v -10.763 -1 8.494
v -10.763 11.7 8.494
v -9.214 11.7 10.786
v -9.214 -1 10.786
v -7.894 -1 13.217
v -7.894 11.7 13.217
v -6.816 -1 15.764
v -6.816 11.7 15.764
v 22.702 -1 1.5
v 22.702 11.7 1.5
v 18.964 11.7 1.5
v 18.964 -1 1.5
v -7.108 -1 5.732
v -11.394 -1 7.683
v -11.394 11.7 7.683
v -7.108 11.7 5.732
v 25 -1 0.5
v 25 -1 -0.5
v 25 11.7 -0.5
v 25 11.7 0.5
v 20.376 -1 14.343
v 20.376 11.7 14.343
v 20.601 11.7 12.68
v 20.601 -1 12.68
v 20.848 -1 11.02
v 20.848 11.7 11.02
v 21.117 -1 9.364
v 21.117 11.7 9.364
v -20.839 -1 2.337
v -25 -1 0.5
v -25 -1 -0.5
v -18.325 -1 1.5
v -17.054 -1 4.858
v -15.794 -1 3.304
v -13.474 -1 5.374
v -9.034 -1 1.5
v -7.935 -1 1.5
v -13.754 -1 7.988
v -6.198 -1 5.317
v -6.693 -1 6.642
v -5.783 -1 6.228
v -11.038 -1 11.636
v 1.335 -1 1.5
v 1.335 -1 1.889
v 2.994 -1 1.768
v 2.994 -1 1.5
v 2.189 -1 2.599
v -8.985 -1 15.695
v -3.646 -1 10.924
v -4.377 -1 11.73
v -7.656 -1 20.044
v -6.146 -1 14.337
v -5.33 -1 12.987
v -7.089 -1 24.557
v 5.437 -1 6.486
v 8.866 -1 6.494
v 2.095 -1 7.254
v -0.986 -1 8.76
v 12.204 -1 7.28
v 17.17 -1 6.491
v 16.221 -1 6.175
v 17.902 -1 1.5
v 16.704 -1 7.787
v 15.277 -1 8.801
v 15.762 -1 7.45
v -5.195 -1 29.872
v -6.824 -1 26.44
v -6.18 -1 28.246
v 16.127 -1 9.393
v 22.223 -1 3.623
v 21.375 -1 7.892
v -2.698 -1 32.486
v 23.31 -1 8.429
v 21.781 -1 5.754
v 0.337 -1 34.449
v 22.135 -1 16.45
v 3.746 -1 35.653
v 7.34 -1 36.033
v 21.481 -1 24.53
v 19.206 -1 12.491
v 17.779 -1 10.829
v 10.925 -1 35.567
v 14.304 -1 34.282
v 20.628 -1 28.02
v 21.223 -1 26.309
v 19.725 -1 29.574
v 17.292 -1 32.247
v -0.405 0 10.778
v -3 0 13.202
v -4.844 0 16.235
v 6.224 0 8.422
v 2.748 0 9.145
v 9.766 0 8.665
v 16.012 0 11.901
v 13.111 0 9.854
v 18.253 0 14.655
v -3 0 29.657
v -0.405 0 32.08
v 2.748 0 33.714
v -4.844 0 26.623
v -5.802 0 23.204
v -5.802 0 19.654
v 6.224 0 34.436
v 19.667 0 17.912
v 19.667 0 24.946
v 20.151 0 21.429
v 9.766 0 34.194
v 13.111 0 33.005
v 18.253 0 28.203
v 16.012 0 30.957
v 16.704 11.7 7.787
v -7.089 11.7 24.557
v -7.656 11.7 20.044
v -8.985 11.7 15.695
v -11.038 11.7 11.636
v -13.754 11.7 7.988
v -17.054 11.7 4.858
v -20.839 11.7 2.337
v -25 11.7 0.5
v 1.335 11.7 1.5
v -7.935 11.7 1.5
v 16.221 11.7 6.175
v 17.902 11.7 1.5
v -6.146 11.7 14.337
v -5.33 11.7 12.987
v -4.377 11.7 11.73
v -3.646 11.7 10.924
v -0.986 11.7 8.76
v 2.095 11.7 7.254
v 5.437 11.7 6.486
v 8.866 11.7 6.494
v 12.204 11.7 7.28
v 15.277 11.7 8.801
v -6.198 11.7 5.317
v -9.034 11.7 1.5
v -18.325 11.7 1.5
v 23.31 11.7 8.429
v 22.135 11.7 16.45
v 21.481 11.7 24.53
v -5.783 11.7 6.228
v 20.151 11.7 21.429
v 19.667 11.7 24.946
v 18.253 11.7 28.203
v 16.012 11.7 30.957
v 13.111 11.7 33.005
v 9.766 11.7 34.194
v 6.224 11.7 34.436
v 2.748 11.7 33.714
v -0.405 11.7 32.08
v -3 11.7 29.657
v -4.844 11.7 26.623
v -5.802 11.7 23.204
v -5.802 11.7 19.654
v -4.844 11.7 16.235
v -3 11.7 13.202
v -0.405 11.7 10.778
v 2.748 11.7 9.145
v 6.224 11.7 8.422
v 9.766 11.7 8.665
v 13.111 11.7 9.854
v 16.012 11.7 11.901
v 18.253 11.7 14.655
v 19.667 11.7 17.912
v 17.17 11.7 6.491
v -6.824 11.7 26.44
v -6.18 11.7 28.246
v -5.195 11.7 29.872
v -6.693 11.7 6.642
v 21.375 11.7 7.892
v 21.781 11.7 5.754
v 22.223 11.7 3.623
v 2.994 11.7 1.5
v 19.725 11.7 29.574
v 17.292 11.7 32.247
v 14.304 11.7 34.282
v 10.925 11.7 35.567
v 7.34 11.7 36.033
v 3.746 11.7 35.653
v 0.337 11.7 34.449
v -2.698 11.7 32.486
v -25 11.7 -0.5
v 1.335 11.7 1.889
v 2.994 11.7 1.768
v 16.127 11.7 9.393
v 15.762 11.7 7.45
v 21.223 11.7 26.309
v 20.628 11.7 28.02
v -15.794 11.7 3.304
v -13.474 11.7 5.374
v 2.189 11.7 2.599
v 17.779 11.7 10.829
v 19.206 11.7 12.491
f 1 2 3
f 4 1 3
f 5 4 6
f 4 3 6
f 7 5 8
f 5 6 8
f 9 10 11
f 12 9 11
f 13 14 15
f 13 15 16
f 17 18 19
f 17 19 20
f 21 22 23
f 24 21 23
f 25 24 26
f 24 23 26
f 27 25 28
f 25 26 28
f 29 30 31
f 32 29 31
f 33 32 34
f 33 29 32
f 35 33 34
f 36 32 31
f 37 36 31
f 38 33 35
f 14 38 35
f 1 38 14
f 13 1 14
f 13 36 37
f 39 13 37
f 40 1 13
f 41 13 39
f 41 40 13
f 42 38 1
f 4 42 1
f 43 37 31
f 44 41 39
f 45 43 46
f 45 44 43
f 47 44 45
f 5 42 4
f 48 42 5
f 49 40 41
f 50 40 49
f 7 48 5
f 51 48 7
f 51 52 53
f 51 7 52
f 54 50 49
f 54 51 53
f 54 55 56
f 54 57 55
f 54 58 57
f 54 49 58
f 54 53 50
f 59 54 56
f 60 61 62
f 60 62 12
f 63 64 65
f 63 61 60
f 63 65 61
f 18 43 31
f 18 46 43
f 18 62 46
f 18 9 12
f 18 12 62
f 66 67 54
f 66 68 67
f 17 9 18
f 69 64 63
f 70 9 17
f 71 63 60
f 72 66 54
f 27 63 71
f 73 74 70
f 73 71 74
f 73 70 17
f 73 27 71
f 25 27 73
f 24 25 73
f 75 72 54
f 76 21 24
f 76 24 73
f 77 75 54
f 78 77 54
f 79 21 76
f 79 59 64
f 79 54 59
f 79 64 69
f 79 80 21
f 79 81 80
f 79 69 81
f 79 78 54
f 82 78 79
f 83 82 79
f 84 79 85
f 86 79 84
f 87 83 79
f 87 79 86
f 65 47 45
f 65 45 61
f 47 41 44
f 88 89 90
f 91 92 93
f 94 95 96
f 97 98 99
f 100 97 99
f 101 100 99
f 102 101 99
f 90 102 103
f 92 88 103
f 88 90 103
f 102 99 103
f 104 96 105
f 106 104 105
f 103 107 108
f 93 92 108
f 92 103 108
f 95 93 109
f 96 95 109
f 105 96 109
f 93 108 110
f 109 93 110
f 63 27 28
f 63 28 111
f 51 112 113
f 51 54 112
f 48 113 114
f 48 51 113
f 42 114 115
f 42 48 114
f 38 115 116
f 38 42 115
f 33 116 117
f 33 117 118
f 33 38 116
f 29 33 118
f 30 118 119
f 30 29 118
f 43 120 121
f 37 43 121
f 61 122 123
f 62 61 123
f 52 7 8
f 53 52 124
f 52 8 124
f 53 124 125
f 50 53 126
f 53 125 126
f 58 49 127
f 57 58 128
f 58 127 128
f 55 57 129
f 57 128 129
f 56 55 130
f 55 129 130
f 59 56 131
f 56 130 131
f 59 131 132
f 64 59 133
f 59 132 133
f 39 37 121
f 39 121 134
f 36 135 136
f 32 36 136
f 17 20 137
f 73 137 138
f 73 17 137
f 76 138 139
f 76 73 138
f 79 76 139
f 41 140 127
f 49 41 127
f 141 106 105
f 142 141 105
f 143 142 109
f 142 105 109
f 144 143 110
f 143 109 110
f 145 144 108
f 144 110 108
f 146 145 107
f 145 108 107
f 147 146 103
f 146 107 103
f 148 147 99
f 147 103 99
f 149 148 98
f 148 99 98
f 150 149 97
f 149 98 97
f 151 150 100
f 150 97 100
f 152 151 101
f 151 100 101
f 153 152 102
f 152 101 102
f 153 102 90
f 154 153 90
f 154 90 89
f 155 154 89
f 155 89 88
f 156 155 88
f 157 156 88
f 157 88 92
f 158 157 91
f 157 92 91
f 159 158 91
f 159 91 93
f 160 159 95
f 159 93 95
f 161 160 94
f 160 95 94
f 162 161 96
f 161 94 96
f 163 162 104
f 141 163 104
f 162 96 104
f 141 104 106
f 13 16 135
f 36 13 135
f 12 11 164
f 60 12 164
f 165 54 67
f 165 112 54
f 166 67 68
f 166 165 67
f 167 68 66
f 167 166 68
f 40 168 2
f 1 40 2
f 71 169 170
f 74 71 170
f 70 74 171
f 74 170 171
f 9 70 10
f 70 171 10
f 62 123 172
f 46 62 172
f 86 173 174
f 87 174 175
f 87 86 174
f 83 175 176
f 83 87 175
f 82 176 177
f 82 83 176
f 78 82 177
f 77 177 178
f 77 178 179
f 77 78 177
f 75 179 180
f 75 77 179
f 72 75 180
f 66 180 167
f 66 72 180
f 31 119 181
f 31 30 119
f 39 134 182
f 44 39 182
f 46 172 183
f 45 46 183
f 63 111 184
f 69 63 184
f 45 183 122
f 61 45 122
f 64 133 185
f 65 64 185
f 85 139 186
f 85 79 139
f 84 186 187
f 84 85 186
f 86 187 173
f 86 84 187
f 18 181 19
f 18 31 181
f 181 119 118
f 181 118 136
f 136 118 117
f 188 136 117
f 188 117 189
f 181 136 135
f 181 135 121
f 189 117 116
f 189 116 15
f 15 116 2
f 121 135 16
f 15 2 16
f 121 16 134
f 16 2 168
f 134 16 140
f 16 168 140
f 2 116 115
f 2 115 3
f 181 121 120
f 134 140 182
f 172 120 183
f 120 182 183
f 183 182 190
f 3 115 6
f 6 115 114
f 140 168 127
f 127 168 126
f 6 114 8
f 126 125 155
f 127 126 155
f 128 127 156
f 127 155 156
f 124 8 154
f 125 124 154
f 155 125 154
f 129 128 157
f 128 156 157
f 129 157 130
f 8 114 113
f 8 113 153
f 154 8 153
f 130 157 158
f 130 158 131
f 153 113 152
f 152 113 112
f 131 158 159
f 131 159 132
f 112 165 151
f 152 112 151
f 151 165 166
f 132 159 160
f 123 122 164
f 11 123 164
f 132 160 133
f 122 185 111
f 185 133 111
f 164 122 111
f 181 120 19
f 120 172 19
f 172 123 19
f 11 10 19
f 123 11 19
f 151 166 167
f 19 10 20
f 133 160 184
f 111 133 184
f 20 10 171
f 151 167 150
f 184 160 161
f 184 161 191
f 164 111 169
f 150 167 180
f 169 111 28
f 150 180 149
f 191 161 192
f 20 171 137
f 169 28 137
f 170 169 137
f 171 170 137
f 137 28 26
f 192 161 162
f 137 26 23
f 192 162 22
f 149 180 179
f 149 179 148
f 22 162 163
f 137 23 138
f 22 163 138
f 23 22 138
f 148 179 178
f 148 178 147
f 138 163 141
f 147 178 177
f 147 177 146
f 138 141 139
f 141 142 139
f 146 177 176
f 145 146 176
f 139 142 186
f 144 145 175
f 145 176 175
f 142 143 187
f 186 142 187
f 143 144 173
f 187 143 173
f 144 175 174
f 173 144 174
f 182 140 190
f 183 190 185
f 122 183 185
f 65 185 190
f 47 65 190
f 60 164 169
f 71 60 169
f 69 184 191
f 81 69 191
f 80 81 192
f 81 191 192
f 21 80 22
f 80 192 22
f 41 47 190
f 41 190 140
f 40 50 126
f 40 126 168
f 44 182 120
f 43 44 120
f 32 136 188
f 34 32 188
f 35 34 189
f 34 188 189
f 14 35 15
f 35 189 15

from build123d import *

# Parameters (mm, degrees)
F0_R     = 13.037168
F1_DEPTH = 1
F2_DEPTH = 11.7
F4_DEPTH = 25
F5_R     = 9.452617


with BuildPart() as f1:
    # F0 (on Front) → F1 (new body)
    with BuildSketch(Plane.XZ):
        with BuildLine():
            Line((-25, -0.5), (25, -0.5))
            Line((25, -0.5), (25, 0.5))
            ThreePointArc((25, 0.5), (22.513025, 13.448456), (21.397779, 26.586331))
            ThreePointArc((21.397779, 26.586331), (7.155404, 36.033672), (-7.086971, 26.586331))
            ThreePointArc((-7.086971, 26.586331), (-11.727618, 10.579535), (-25, 0.5))
            Line((-25, 0.5), (-25, -0.5))
        make_face()
        with Locations((7.113422, 21.42911)):
            Circle(F0_R, mode=Mode.SUBTRACT)
        with Locations((7.113422, 21.42911)):
            Circle(F0_R)
    extrude(amount=F1_DEPTH)

    # F0 (on Front) → F2 (join)
    with BuildSketch(Plane.XZ):
        with BuildLine():
            Line((-25, -0.5), (25, -0.5))
            Line((25, -0.5), (25, 0.5))
            ThreePointArc((25, 0.5), (22.513025, 13.448456), (21.397779, 26.586331))
            ThreePointArc((21.397779, 26.586331), (7.155404, 36.033672), (-7.086971, 26.586331))
            ThreePointArc((-7.086971, 26.586331), (-11.727618, 10.579535), (-25, 0.5))
            Line((-25, 0.5), (-25, -0.5))
        make_face()
        with Locations((7.113422, 21.42911)):
            Circle(F0_R, mode=Mode.SUBTRACT)
    extrude(amount=-F2_DEPTH)

    # F3 (on face) → F4 (cut)
    with BuildSketch(Plane(origin=(0, 11.7, 0), x_dir=(-1, 0, 0), z_dir=(0, 1, 0))):
        with BuildLine():
            Line((-17.169921, 6.49079), (-21.374672, 7.891529))
            ThreePointArc((-21.374672, 7.891529), (-21.997455, 4.687271), (-22.702033, 1.5))
            Line((-22.702033, 1.5), (-18.964415, 1.5))
            Line((-18.964415, 1.5), (-17.169921, 6.49079))
        make_face()
        with BuildLine():
            Line((-16.703859, 7.786989), (-16.126572, 9.392519))
            ThreePointArc((-16.126572, 9.392519), (-18.523006, 11.634326), (-20.376068, 14.342601))
            ThreePointArc((-20.376068, 14.342601), (-20.721893, 11.849812), (-21.116834, 9.364331))
            Line((-21.116834, 9.364331), (-16.703859, 7.786989))
        make_face()
        with BuildLine():
            Line((5.783263, 6.227552), (3.645503, 10.923782))
            ThreePointArc((3.645503, 10.923782), (-5.436746, 6.485712), (-15.276698, 8.800677))
            Line((-15.276698, 8.800677), (-15.762202, 7.450409))
            Line((-15.762202, 7.450409), (-2.188527, 2.598733))
            Line((-2.188527, 2.598733), (5.783263, 6.227552))
        make_face()
        Polygon((-17.901738, 1.5), (-2.994426, 1.5), (-2.994426, 1.768471), (-16.220917, 6.174646), align=None)
        Polygon((-1.334743, 1.5), (7.935281, 1.5), (6.197565, 5.317413), (-1.334743, 1.888649), align=None)
        with BuildLine():
            ThreePointArc((18.324978, 1.5), (14.605987, 4.307356), (11.393648, 7.682709))
            Line((11.393648, 7.682709), (7.107705, 5.731715))
            Line((7.107705, 5.731715), (9.034014, 1.5))
            Line((9.034014, 1.5), (18.324978, 1.5))
        make_face()
        with BuildLine():
            ThreePointArc((10.762688, 8.494224), (8.524386, 11.985495), (6.815958, 15.764417))
            ThreePointArc((6.815958, 15.764417), (5.755764, 13.650907), (4.377367, 11.729721))
            Line((4.377367, 11.729721), (6.693402, 6.641855))
            Line((6.693402, 6.641855), (10.762688, 8.494224))
        make_face()
    extrude(amount=-F4_DEPTH, mode=Mode.SUBTRACT)

    # F5
    f5_edges = [f1.edges().sort_by_distance(p)[0] for p in [
        (-7.086971, 5.35, 26.586331),
        (21.397779, 5.35, 26.586331),
    ]]
    fillet(f5_edges, radius=F5_R)


solid = f1.part
